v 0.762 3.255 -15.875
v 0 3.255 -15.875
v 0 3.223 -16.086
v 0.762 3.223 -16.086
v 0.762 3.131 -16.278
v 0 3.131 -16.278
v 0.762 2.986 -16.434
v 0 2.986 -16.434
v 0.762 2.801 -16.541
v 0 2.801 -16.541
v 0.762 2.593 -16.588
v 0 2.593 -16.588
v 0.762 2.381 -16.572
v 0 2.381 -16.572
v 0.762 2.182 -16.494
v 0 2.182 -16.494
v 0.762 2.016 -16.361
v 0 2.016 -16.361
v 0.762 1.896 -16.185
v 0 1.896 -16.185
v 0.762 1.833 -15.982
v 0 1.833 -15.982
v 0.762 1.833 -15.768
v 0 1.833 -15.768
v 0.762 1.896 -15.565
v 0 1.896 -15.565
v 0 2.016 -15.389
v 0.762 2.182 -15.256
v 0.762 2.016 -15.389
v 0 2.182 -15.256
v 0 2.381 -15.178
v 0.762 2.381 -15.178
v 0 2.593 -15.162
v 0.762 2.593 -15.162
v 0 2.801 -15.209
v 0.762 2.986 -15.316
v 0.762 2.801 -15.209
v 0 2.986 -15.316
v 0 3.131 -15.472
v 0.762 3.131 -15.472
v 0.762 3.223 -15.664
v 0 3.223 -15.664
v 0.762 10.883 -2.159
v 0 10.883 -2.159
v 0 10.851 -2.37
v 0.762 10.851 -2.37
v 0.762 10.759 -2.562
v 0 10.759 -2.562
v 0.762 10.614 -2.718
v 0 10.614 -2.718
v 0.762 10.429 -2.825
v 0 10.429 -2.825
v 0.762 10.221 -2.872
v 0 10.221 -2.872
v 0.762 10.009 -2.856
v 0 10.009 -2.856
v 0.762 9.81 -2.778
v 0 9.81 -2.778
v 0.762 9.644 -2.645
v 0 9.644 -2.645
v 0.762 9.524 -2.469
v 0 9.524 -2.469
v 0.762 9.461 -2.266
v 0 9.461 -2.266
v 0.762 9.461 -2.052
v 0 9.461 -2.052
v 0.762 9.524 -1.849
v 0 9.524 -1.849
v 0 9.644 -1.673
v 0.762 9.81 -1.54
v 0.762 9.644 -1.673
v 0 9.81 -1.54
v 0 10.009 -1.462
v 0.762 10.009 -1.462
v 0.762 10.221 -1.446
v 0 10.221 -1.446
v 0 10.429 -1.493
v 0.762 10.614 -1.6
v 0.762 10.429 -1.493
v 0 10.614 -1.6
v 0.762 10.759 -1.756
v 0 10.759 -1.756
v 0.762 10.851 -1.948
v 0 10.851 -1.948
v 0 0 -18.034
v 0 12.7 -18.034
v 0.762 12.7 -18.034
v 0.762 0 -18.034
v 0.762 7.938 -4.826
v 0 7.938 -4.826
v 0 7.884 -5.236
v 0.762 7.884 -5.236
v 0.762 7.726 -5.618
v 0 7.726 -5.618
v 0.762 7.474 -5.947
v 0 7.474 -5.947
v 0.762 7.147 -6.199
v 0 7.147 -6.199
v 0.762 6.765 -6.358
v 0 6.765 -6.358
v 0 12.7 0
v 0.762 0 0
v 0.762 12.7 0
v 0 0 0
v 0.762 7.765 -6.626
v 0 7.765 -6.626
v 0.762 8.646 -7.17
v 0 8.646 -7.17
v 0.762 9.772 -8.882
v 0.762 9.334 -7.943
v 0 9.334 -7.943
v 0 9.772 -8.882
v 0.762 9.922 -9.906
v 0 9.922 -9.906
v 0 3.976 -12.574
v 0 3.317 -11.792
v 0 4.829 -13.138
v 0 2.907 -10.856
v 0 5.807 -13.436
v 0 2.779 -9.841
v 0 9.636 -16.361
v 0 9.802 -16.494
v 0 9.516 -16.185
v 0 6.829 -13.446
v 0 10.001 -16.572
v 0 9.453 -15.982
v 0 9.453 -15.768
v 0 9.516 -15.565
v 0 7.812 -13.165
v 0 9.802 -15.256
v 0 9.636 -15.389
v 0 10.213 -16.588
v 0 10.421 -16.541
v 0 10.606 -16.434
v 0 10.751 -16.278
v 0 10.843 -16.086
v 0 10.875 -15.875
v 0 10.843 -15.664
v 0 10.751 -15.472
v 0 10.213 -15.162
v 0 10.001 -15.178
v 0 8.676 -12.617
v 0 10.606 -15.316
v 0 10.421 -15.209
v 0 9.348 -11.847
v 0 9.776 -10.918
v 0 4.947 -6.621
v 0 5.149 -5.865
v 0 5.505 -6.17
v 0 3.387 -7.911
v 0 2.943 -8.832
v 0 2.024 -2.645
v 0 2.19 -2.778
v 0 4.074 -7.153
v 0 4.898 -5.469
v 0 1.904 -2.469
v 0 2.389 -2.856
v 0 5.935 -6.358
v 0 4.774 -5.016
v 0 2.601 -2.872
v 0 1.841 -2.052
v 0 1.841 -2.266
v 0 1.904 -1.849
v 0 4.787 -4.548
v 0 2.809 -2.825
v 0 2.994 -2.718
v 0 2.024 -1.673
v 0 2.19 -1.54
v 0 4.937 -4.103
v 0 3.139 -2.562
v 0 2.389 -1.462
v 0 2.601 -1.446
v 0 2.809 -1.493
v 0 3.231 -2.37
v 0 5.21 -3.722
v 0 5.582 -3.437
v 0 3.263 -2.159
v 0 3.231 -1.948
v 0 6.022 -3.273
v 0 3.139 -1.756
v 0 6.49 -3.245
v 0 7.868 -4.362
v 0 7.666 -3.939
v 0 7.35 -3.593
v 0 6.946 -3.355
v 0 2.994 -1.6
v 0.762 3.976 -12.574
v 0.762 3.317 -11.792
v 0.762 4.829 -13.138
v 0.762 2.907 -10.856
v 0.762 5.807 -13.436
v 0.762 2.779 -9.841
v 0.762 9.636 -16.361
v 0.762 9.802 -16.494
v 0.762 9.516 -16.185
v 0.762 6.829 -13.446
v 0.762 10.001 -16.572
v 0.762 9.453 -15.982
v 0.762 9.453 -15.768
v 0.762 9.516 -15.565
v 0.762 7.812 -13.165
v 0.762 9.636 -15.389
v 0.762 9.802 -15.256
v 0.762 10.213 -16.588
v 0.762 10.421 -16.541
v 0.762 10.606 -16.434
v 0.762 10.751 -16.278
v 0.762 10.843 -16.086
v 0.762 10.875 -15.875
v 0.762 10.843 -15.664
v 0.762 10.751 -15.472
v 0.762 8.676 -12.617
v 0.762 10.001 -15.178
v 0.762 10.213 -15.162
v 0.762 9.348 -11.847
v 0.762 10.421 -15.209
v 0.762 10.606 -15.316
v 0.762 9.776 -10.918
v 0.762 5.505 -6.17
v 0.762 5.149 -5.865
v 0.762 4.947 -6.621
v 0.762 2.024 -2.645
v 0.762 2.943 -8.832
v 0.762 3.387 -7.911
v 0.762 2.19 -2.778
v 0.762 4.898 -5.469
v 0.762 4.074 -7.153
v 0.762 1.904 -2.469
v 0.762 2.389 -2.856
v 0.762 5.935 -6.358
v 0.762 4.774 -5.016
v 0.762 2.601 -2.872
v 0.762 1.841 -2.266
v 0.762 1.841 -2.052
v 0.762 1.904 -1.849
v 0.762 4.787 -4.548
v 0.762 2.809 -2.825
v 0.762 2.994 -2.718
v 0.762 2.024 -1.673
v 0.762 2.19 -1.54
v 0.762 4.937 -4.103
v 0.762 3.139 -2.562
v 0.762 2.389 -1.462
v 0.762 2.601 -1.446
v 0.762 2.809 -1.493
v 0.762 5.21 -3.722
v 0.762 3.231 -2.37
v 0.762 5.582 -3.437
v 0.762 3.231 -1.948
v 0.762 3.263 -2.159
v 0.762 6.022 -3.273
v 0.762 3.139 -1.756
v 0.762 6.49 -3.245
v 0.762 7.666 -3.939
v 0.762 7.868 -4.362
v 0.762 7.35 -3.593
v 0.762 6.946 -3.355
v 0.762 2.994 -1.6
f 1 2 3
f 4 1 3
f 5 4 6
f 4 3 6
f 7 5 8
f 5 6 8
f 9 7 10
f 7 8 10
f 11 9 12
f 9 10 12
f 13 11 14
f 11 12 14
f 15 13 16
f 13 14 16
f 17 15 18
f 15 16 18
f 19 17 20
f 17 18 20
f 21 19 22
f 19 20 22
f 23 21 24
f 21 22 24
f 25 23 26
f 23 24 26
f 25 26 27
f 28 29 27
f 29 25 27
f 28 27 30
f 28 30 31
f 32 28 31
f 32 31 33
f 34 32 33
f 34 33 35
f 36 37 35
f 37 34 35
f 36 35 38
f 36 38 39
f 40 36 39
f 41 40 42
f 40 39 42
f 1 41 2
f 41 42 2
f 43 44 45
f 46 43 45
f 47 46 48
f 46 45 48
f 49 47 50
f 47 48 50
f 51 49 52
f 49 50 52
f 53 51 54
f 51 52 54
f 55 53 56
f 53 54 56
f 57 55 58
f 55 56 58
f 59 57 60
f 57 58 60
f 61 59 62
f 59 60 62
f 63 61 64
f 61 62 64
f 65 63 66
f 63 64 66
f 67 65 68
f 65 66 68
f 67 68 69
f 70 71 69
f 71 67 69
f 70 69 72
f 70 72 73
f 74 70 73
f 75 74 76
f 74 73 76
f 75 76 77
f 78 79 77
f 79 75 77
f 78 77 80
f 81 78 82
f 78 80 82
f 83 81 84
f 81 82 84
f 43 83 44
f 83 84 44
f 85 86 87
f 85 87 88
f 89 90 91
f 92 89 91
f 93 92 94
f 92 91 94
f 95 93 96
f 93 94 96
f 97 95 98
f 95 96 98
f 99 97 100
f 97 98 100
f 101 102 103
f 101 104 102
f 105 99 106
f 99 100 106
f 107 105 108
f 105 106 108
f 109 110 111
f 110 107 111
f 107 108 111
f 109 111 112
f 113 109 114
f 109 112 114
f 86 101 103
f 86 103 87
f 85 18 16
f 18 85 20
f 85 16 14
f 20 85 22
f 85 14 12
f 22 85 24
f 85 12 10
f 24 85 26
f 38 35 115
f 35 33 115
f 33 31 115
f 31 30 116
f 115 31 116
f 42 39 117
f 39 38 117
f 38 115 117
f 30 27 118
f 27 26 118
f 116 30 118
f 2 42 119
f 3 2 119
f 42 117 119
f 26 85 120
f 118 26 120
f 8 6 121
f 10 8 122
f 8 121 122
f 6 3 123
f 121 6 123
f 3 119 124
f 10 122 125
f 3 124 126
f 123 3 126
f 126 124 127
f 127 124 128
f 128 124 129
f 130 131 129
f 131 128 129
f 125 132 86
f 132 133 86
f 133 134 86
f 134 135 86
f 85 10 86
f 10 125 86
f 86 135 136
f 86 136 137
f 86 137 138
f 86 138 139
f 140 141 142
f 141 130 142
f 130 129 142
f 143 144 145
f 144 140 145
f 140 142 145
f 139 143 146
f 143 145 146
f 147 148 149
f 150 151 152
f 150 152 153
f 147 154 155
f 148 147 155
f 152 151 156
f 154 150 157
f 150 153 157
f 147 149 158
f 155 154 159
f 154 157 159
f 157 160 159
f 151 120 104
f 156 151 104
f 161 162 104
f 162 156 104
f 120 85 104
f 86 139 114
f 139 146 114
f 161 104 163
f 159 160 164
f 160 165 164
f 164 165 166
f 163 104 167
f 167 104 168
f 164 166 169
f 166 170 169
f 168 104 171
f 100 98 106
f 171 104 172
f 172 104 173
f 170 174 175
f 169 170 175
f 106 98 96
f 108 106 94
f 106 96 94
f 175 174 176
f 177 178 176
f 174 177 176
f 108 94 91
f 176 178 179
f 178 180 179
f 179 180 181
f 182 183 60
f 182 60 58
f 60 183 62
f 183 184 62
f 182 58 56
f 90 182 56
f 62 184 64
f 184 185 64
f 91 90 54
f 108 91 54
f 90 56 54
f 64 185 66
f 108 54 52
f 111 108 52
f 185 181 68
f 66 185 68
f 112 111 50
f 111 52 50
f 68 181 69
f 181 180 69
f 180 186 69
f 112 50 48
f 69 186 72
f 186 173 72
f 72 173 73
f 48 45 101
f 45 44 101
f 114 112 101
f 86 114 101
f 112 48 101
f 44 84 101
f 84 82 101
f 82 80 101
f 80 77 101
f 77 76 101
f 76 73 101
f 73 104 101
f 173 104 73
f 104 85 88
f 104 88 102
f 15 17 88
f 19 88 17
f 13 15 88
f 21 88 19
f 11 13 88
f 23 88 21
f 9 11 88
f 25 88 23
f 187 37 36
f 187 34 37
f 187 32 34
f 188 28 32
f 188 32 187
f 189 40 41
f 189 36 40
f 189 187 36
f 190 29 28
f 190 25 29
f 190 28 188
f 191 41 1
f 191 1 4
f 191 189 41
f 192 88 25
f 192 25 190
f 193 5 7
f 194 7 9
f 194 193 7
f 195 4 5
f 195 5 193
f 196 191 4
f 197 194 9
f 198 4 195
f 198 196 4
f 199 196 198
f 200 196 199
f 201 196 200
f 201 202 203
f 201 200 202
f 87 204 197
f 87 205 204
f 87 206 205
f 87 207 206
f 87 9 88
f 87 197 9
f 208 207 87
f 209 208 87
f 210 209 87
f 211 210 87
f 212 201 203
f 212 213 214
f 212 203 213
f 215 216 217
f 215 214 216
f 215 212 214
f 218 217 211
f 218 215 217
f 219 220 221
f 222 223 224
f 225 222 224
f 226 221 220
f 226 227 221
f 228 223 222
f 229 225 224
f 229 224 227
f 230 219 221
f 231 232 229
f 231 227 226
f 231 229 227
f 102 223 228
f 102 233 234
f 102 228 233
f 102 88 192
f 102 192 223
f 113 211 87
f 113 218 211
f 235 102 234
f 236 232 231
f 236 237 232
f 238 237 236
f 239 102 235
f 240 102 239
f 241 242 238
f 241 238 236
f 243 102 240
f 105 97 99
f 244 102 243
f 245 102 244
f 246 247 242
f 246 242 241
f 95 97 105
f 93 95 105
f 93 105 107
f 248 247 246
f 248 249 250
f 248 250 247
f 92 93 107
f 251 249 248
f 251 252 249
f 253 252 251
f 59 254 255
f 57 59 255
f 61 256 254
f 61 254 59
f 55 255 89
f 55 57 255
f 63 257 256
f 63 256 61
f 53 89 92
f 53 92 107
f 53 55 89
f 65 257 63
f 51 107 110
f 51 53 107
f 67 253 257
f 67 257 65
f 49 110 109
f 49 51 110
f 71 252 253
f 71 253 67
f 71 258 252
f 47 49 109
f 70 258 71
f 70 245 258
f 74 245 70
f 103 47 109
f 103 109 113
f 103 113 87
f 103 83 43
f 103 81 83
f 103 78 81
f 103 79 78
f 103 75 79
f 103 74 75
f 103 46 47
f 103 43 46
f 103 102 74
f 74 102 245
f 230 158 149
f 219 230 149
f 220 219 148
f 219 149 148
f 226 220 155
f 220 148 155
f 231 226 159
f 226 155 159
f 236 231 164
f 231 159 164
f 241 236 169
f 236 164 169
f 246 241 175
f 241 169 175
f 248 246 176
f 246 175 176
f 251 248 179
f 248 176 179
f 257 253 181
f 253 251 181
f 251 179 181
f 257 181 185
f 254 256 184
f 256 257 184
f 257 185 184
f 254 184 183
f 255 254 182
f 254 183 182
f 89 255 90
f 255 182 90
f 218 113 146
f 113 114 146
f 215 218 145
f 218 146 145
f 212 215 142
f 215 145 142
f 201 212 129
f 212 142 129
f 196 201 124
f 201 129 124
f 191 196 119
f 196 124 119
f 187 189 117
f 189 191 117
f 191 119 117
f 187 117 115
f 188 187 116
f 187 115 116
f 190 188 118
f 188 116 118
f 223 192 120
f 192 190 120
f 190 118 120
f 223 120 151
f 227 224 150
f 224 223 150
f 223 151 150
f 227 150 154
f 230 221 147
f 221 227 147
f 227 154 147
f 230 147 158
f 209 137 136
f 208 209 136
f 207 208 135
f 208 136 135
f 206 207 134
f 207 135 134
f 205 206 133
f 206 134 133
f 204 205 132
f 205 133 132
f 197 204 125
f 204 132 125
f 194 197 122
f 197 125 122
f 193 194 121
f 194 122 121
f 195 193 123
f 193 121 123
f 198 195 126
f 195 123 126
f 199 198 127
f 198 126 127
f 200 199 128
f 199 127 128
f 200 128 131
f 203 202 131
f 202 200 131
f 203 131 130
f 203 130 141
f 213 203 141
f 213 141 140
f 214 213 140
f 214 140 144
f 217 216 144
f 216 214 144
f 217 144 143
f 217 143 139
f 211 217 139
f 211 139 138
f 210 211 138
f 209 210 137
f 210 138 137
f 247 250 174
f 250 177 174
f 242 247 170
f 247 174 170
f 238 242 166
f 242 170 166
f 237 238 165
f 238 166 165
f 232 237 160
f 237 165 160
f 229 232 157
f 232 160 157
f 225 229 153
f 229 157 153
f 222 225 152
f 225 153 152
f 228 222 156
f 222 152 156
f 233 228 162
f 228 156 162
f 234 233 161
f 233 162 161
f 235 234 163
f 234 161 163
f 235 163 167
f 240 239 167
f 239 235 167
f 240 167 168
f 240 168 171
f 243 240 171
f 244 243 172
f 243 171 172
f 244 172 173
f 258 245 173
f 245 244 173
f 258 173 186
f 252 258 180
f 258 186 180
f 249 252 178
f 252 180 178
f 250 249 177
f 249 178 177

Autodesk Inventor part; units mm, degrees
ref_plane "YZ Plane" through (0, 0, 0) normal (1, 0, 0) x (0, 1, 0)
ref_plane "XZ Plane" through (0, 0, 0) normal (0, 1, 0) x (-1, 0, 0)
ref_plane "XY Plane" through (0, 0, 0) normal (0, 0, 1) x (1, 0, 0)
sketch "Sketch1" plane through (0, 0, 0) normal (1, 0, 0) x (0, 1, 0)
  line L0 (0, 0) -> (12.7, 0)
  line L1 (12.7, 0) -> (12.7, -18.034)
  line L2 (12.7, -18.034) -> (0, -18.034)
  line L3 (0, -18.034) -> (0, 0)
  line L4 (-3.175, 0) -> (15.875, 0)
  line L5 (15.875, 0) -> (15.875, -18.034)
  line L6 (15.875, -18.034) -> (-3.175, -18.034)
  line L7 (-3.175, -18.034) -> (-3.175, 0)
  circle A0 centre (2.54, -15.875) radius 0.715
  circle A1 centre (2.548, -2.159) radius 0.715
  circle A2 centre (10.168, -2.159) radius 0.715
  circle A3 centre (10.16, -15.875) radius 0.715
  circle A4 centre (6.35, -9.906) radius 3.5719
  circle A5 centre (6.35, -4.826) radius 1.5875
  point P0 (6.35, 0)
  point P1 (6.765, -6.3583)
  point P2 (5.935, -6.3583)
  dimension "d0" = 12.7
  dimension "d1" = 18.034
  dimension "d2" = 19.05
  dimension "d3" = 3.175
  dimension "d5" = 1.43
  dimension "d9" = 13.716
  dimension "d10" = 7.62
  dimension "d11" = 7.62
  dimension "d12" = 13.716
  dimension "d13" = 2.54
  dimension "d20" = 7.1437
  dimension "d21" = 3.175
  dimension "d23" = 2.159
  dimension "d24" = 2.159
extrude "Extrusion1" add sketch "Sketch1" along normal blind 0.762 contours L0 L1 L2 L3
properties part number "Base Top"
